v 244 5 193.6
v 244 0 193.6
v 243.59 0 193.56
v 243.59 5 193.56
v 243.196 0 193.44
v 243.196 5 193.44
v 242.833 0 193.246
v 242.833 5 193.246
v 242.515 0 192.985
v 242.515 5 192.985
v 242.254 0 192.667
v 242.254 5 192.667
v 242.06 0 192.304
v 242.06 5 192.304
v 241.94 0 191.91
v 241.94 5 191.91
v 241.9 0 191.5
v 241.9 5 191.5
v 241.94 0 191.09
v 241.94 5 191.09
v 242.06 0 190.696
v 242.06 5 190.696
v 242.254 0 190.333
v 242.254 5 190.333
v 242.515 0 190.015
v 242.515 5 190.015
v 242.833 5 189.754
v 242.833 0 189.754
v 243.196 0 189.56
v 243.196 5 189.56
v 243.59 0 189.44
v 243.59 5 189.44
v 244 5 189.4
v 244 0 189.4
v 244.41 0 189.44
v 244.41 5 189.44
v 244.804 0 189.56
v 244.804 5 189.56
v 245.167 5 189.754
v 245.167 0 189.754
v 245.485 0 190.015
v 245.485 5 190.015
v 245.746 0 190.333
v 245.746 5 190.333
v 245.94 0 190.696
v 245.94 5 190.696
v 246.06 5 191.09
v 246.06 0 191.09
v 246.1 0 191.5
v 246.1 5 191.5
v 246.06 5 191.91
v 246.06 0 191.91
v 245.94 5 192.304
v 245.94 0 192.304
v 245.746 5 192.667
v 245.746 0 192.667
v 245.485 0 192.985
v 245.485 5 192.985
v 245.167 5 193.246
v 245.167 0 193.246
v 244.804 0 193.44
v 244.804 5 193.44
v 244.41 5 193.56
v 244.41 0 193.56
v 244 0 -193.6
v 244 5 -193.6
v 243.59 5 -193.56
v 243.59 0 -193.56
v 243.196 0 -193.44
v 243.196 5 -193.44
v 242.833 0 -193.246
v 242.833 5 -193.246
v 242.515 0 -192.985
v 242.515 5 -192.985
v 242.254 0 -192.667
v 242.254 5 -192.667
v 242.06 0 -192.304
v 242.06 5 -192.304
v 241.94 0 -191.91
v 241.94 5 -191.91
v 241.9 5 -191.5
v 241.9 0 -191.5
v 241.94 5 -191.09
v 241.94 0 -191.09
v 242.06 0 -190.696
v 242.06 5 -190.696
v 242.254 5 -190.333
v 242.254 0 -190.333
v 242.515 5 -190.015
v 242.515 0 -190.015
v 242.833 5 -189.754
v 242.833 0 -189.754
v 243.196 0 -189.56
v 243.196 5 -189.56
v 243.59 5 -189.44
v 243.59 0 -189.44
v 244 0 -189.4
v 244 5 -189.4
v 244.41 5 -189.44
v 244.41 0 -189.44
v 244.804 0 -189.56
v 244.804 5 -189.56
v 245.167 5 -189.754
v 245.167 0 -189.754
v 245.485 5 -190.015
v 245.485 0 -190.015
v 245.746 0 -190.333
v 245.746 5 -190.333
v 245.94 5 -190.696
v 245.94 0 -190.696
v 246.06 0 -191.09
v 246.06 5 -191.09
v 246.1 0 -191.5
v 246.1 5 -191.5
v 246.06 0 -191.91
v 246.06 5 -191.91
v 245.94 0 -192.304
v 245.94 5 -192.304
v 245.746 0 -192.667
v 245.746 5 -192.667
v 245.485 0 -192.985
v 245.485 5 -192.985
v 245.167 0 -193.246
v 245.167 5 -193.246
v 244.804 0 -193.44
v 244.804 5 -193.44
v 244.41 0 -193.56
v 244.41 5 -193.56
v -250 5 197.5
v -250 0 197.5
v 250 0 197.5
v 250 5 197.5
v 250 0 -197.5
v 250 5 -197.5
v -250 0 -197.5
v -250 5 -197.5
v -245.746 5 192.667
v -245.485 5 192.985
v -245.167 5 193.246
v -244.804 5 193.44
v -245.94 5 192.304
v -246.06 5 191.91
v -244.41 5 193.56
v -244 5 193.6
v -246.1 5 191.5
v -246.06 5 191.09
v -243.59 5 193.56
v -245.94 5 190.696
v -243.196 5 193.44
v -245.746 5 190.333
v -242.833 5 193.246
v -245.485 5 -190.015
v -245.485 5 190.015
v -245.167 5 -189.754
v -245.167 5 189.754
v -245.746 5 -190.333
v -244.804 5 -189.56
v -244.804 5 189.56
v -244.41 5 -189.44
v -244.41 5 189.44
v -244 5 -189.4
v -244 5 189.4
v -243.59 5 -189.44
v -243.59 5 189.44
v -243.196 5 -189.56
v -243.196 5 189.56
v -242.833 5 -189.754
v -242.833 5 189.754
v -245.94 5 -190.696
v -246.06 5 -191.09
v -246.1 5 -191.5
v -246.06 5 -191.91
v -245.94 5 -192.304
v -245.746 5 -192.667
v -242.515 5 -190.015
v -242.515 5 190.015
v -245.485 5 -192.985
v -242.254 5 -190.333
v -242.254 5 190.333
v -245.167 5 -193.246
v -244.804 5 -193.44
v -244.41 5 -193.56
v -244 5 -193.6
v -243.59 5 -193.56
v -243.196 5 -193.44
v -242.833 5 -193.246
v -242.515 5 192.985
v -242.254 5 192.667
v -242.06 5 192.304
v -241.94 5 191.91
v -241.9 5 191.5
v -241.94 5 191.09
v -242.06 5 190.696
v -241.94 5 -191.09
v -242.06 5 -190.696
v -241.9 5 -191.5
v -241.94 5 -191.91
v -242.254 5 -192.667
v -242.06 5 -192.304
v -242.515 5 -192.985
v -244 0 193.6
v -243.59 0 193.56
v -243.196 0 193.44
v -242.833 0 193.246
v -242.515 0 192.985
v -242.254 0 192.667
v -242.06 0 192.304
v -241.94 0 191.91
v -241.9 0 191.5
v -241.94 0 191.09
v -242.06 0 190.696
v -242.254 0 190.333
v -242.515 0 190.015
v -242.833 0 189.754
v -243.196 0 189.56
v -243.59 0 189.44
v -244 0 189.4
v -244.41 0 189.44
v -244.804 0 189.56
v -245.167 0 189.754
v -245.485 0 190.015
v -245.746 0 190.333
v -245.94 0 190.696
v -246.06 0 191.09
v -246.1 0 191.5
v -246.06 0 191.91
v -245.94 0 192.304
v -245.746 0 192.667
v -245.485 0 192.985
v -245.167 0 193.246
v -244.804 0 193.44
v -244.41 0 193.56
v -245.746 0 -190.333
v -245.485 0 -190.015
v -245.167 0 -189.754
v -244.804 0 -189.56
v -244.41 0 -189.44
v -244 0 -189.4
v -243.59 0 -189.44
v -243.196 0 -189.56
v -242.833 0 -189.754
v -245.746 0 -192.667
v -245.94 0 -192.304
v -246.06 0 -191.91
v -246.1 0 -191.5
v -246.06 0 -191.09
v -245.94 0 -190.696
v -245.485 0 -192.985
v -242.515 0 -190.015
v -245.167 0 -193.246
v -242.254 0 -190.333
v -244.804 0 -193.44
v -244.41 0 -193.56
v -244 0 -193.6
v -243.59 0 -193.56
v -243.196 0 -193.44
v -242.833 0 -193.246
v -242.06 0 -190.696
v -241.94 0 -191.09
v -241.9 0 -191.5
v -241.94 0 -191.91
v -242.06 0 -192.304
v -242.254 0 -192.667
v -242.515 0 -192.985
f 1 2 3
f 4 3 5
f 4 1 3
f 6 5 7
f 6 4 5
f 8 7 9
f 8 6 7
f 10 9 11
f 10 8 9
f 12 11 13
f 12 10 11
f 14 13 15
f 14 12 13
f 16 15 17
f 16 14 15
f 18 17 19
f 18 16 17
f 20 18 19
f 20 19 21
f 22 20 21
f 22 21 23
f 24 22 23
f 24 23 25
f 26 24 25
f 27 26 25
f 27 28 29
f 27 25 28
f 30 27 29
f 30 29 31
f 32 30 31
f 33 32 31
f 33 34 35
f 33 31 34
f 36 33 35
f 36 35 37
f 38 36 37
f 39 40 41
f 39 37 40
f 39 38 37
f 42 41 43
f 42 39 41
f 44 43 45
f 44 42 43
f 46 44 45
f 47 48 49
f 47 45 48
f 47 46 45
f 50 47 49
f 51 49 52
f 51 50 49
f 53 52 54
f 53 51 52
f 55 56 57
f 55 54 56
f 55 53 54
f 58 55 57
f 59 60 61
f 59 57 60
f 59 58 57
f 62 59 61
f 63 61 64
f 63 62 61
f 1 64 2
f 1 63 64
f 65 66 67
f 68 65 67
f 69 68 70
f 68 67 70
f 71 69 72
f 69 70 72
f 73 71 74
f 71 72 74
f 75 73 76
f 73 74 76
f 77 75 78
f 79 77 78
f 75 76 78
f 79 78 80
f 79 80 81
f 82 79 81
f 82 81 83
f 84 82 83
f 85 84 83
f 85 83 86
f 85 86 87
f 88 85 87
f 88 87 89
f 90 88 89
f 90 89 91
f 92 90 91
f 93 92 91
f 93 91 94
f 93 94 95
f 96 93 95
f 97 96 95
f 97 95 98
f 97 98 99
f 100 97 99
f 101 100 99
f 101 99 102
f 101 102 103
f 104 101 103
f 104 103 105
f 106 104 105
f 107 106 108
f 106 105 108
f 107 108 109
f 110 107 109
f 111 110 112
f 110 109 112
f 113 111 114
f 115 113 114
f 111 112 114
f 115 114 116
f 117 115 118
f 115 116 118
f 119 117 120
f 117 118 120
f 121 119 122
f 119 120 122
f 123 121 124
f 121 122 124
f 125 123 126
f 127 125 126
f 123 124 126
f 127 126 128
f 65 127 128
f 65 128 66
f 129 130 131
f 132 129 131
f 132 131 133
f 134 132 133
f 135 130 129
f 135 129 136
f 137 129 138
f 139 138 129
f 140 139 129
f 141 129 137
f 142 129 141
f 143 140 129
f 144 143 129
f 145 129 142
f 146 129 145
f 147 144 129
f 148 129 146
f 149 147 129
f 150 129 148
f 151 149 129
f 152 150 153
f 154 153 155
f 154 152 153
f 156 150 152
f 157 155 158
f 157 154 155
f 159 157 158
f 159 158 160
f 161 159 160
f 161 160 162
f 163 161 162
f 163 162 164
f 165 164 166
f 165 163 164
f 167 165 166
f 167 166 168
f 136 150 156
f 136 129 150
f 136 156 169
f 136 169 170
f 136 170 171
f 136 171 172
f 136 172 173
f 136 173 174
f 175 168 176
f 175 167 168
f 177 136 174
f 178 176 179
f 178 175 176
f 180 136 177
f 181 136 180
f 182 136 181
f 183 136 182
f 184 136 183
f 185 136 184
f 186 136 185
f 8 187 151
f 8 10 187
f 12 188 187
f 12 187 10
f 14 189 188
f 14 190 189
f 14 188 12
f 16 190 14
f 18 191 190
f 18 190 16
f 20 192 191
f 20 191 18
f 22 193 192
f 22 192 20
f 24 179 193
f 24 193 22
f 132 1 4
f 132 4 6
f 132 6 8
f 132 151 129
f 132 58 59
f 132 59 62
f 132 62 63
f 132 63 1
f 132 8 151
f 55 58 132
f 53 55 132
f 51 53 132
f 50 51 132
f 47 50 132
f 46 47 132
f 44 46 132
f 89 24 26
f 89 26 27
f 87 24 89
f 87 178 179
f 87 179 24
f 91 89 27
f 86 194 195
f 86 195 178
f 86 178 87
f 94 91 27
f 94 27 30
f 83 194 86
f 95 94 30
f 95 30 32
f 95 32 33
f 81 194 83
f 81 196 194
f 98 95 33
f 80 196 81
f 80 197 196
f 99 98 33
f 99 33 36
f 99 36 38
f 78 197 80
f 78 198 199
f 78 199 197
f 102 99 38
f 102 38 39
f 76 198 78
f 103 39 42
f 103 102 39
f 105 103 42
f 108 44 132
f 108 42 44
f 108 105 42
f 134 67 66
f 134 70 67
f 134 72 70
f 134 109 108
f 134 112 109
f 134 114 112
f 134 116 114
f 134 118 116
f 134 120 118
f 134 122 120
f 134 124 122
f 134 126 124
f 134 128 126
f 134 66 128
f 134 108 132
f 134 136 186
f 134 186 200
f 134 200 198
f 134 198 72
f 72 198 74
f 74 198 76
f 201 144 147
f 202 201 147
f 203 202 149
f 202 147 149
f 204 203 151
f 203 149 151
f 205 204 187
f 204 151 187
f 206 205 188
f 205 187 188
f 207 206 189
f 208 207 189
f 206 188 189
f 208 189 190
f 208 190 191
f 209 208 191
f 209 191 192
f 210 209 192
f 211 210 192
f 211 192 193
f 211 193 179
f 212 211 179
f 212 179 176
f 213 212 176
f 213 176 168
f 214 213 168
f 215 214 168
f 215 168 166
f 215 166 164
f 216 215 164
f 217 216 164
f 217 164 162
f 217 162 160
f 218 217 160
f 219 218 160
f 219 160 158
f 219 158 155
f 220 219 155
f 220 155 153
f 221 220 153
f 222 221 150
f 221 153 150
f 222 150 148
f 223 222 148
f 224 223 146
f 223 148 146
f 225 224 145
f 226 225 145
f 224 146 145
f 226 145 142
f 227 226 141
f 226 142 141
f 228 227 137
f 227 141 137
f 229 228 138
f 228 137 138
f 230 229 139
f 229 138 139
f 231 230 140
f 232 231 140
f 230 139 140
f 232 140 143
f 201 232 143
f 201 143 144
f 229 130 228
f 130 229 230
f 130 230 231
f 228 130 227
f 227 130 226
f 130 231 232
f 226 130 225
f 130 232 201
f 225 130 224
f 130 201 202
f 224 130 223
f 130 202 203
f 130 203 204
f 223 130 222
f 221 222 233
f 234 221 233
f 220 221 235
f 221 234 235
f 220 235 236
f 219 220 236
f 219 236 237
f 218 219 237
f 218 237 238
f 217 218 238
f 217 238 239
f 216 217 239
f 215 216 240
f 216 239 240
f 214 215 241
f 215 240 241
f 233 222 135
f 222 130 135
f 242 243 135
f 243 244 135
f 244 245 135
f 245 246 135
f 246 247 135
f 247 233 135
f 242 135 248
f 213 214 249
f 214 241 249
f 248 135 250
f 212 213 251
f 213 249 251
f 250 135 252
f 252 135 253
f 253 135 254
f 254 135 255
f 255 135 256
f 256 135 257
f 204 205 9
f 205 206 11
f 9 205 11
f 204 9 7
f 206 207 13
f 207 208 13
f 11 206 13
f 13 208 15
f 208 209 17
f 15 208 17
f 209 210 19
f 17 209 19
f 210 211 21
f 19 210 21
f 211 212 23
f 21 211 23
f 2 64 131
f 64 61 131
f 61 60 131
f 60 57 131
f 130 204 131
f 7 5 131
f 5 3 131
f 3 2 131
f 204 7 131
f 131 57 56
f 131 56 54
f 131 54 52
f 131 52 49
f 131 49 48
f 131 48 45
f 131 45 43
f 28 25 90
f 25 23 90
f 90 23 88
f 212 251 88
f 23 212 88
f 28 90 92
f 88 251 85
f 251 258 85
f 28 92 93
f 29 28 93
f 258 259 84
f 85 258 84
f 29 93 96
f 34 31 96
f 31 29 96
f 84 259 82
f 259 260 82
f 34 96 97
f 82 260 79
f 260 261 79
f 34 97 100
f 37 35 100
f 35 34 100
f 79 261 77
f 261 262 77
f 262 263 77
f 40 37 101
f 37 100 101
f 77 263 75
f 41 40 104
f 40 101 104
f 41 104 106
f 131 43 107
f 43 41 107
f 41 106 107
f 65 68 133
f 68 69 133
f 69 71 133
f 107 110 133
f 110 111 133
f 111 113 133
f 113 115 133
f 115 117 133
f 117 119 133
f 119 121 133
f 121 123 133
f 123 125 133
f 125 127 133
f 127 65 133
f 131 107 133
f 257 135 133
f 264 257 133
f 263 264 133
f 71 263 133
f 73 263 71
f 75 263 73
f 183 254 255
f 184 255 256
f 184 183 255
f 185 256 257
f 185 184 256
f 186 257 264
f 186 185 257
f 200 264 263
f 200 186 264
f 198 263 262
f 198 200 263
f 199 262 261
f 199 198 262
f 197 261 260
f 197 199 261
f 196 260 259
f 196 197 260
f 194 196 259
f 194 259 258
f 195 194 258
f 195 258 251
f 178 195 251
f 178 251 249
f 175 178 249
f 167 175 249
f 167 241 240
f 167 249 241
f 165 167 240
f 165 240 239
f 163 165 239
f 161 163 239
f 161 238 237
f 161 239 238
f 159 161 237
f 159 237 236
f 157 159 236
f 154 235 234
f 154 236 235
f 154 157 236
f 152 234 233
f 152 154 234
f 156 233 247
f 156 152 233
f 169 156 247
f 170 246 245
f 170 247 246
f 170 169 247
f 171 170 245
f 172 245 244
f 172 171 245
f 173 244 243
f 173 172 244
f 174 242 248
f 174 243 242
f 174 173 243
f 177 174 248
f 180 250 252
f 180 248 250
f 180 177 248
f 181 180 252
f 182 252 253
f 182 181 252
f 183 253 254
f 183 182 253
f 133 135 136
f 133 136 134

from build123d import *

# Parameters (mm, degrees)
ESQUISSE1_W               = 500
ESQUISSE1_H               = 395
BOSS_EXTRU_1_DEPTH        = 5
ESQUISSE2_R               = 2.1
ENL_V_MAT_EXTRU_1_DEPTH   = 319.639686794
SYM_TRIE2_COPY_1_SKETCH_R = 2.1
SYM_TRIE2_COPY_1_DEPTH    = 319.639686794


with BuildPart() as part:
    # Esquisse1 → Boss.-Extru.1 (new body)
    with BuildSketch(Plane(origin=(0, 0, 0), x_dir=(1, 0, 0), z_dir=(0, 1, 0))):
        Rectangle(ESQUISSE1_W, ESQUISSE1_H)
    extrude(amount=BOSS_EXTRU_1_DEPTH)

    # Esquisse2 → Enlèv. mat.-Extru.1 (cut, through all)
    with BuildSketch(Plane(origin=(0, 5, 0), x_dir=(1, 0, 0), z_dir=(0, 1, 0))):
        with Locations(Location((-244, -191.5, 0), (0, 0, 270))):
            Circle(ESQUISSE2_R)
    enl_v_mat_extru_1 = extrude(amount=-ENL_V_MAT_EXTRU_1_DEPTH, mode=Mode.SUBTRACT)

    # Symétrie1: Enlèv. mat.-Extru.1 across plane
    add(enl_v_mat_extru_1.mirror(Plane(origin=(0, 0, 0), x_dir=(0, 0, 1), z_dir=(1, 0, 0))), mode=Mode.SUBTRACT)

    # Symétrie2: Enlèv. mat.-Extru.1 across plane
    add(enl_v_mat_extru_1.mirror(Plane.XY), mode=Mode.SUBTRACT)

    # Symétrie2 copy 1 sketch → Symétrie2 copy 1 (cut, through all)
    with BuildSketch(Plane(origin=(0, 5, 0), x_dir=(-1, 0, 0), z_dir=(0, 1, 0))):
        with Locations(Location((-244, -191.5, 0), (0, 0, 270))):
            Circle(SYM_TRIE2_COPY_1_SKETCH_R)
    extrude(amount=-SYM_TRIE2_COPY_1_DEPTH, mode=Mode.SUBTRACT)


solid = part.part
